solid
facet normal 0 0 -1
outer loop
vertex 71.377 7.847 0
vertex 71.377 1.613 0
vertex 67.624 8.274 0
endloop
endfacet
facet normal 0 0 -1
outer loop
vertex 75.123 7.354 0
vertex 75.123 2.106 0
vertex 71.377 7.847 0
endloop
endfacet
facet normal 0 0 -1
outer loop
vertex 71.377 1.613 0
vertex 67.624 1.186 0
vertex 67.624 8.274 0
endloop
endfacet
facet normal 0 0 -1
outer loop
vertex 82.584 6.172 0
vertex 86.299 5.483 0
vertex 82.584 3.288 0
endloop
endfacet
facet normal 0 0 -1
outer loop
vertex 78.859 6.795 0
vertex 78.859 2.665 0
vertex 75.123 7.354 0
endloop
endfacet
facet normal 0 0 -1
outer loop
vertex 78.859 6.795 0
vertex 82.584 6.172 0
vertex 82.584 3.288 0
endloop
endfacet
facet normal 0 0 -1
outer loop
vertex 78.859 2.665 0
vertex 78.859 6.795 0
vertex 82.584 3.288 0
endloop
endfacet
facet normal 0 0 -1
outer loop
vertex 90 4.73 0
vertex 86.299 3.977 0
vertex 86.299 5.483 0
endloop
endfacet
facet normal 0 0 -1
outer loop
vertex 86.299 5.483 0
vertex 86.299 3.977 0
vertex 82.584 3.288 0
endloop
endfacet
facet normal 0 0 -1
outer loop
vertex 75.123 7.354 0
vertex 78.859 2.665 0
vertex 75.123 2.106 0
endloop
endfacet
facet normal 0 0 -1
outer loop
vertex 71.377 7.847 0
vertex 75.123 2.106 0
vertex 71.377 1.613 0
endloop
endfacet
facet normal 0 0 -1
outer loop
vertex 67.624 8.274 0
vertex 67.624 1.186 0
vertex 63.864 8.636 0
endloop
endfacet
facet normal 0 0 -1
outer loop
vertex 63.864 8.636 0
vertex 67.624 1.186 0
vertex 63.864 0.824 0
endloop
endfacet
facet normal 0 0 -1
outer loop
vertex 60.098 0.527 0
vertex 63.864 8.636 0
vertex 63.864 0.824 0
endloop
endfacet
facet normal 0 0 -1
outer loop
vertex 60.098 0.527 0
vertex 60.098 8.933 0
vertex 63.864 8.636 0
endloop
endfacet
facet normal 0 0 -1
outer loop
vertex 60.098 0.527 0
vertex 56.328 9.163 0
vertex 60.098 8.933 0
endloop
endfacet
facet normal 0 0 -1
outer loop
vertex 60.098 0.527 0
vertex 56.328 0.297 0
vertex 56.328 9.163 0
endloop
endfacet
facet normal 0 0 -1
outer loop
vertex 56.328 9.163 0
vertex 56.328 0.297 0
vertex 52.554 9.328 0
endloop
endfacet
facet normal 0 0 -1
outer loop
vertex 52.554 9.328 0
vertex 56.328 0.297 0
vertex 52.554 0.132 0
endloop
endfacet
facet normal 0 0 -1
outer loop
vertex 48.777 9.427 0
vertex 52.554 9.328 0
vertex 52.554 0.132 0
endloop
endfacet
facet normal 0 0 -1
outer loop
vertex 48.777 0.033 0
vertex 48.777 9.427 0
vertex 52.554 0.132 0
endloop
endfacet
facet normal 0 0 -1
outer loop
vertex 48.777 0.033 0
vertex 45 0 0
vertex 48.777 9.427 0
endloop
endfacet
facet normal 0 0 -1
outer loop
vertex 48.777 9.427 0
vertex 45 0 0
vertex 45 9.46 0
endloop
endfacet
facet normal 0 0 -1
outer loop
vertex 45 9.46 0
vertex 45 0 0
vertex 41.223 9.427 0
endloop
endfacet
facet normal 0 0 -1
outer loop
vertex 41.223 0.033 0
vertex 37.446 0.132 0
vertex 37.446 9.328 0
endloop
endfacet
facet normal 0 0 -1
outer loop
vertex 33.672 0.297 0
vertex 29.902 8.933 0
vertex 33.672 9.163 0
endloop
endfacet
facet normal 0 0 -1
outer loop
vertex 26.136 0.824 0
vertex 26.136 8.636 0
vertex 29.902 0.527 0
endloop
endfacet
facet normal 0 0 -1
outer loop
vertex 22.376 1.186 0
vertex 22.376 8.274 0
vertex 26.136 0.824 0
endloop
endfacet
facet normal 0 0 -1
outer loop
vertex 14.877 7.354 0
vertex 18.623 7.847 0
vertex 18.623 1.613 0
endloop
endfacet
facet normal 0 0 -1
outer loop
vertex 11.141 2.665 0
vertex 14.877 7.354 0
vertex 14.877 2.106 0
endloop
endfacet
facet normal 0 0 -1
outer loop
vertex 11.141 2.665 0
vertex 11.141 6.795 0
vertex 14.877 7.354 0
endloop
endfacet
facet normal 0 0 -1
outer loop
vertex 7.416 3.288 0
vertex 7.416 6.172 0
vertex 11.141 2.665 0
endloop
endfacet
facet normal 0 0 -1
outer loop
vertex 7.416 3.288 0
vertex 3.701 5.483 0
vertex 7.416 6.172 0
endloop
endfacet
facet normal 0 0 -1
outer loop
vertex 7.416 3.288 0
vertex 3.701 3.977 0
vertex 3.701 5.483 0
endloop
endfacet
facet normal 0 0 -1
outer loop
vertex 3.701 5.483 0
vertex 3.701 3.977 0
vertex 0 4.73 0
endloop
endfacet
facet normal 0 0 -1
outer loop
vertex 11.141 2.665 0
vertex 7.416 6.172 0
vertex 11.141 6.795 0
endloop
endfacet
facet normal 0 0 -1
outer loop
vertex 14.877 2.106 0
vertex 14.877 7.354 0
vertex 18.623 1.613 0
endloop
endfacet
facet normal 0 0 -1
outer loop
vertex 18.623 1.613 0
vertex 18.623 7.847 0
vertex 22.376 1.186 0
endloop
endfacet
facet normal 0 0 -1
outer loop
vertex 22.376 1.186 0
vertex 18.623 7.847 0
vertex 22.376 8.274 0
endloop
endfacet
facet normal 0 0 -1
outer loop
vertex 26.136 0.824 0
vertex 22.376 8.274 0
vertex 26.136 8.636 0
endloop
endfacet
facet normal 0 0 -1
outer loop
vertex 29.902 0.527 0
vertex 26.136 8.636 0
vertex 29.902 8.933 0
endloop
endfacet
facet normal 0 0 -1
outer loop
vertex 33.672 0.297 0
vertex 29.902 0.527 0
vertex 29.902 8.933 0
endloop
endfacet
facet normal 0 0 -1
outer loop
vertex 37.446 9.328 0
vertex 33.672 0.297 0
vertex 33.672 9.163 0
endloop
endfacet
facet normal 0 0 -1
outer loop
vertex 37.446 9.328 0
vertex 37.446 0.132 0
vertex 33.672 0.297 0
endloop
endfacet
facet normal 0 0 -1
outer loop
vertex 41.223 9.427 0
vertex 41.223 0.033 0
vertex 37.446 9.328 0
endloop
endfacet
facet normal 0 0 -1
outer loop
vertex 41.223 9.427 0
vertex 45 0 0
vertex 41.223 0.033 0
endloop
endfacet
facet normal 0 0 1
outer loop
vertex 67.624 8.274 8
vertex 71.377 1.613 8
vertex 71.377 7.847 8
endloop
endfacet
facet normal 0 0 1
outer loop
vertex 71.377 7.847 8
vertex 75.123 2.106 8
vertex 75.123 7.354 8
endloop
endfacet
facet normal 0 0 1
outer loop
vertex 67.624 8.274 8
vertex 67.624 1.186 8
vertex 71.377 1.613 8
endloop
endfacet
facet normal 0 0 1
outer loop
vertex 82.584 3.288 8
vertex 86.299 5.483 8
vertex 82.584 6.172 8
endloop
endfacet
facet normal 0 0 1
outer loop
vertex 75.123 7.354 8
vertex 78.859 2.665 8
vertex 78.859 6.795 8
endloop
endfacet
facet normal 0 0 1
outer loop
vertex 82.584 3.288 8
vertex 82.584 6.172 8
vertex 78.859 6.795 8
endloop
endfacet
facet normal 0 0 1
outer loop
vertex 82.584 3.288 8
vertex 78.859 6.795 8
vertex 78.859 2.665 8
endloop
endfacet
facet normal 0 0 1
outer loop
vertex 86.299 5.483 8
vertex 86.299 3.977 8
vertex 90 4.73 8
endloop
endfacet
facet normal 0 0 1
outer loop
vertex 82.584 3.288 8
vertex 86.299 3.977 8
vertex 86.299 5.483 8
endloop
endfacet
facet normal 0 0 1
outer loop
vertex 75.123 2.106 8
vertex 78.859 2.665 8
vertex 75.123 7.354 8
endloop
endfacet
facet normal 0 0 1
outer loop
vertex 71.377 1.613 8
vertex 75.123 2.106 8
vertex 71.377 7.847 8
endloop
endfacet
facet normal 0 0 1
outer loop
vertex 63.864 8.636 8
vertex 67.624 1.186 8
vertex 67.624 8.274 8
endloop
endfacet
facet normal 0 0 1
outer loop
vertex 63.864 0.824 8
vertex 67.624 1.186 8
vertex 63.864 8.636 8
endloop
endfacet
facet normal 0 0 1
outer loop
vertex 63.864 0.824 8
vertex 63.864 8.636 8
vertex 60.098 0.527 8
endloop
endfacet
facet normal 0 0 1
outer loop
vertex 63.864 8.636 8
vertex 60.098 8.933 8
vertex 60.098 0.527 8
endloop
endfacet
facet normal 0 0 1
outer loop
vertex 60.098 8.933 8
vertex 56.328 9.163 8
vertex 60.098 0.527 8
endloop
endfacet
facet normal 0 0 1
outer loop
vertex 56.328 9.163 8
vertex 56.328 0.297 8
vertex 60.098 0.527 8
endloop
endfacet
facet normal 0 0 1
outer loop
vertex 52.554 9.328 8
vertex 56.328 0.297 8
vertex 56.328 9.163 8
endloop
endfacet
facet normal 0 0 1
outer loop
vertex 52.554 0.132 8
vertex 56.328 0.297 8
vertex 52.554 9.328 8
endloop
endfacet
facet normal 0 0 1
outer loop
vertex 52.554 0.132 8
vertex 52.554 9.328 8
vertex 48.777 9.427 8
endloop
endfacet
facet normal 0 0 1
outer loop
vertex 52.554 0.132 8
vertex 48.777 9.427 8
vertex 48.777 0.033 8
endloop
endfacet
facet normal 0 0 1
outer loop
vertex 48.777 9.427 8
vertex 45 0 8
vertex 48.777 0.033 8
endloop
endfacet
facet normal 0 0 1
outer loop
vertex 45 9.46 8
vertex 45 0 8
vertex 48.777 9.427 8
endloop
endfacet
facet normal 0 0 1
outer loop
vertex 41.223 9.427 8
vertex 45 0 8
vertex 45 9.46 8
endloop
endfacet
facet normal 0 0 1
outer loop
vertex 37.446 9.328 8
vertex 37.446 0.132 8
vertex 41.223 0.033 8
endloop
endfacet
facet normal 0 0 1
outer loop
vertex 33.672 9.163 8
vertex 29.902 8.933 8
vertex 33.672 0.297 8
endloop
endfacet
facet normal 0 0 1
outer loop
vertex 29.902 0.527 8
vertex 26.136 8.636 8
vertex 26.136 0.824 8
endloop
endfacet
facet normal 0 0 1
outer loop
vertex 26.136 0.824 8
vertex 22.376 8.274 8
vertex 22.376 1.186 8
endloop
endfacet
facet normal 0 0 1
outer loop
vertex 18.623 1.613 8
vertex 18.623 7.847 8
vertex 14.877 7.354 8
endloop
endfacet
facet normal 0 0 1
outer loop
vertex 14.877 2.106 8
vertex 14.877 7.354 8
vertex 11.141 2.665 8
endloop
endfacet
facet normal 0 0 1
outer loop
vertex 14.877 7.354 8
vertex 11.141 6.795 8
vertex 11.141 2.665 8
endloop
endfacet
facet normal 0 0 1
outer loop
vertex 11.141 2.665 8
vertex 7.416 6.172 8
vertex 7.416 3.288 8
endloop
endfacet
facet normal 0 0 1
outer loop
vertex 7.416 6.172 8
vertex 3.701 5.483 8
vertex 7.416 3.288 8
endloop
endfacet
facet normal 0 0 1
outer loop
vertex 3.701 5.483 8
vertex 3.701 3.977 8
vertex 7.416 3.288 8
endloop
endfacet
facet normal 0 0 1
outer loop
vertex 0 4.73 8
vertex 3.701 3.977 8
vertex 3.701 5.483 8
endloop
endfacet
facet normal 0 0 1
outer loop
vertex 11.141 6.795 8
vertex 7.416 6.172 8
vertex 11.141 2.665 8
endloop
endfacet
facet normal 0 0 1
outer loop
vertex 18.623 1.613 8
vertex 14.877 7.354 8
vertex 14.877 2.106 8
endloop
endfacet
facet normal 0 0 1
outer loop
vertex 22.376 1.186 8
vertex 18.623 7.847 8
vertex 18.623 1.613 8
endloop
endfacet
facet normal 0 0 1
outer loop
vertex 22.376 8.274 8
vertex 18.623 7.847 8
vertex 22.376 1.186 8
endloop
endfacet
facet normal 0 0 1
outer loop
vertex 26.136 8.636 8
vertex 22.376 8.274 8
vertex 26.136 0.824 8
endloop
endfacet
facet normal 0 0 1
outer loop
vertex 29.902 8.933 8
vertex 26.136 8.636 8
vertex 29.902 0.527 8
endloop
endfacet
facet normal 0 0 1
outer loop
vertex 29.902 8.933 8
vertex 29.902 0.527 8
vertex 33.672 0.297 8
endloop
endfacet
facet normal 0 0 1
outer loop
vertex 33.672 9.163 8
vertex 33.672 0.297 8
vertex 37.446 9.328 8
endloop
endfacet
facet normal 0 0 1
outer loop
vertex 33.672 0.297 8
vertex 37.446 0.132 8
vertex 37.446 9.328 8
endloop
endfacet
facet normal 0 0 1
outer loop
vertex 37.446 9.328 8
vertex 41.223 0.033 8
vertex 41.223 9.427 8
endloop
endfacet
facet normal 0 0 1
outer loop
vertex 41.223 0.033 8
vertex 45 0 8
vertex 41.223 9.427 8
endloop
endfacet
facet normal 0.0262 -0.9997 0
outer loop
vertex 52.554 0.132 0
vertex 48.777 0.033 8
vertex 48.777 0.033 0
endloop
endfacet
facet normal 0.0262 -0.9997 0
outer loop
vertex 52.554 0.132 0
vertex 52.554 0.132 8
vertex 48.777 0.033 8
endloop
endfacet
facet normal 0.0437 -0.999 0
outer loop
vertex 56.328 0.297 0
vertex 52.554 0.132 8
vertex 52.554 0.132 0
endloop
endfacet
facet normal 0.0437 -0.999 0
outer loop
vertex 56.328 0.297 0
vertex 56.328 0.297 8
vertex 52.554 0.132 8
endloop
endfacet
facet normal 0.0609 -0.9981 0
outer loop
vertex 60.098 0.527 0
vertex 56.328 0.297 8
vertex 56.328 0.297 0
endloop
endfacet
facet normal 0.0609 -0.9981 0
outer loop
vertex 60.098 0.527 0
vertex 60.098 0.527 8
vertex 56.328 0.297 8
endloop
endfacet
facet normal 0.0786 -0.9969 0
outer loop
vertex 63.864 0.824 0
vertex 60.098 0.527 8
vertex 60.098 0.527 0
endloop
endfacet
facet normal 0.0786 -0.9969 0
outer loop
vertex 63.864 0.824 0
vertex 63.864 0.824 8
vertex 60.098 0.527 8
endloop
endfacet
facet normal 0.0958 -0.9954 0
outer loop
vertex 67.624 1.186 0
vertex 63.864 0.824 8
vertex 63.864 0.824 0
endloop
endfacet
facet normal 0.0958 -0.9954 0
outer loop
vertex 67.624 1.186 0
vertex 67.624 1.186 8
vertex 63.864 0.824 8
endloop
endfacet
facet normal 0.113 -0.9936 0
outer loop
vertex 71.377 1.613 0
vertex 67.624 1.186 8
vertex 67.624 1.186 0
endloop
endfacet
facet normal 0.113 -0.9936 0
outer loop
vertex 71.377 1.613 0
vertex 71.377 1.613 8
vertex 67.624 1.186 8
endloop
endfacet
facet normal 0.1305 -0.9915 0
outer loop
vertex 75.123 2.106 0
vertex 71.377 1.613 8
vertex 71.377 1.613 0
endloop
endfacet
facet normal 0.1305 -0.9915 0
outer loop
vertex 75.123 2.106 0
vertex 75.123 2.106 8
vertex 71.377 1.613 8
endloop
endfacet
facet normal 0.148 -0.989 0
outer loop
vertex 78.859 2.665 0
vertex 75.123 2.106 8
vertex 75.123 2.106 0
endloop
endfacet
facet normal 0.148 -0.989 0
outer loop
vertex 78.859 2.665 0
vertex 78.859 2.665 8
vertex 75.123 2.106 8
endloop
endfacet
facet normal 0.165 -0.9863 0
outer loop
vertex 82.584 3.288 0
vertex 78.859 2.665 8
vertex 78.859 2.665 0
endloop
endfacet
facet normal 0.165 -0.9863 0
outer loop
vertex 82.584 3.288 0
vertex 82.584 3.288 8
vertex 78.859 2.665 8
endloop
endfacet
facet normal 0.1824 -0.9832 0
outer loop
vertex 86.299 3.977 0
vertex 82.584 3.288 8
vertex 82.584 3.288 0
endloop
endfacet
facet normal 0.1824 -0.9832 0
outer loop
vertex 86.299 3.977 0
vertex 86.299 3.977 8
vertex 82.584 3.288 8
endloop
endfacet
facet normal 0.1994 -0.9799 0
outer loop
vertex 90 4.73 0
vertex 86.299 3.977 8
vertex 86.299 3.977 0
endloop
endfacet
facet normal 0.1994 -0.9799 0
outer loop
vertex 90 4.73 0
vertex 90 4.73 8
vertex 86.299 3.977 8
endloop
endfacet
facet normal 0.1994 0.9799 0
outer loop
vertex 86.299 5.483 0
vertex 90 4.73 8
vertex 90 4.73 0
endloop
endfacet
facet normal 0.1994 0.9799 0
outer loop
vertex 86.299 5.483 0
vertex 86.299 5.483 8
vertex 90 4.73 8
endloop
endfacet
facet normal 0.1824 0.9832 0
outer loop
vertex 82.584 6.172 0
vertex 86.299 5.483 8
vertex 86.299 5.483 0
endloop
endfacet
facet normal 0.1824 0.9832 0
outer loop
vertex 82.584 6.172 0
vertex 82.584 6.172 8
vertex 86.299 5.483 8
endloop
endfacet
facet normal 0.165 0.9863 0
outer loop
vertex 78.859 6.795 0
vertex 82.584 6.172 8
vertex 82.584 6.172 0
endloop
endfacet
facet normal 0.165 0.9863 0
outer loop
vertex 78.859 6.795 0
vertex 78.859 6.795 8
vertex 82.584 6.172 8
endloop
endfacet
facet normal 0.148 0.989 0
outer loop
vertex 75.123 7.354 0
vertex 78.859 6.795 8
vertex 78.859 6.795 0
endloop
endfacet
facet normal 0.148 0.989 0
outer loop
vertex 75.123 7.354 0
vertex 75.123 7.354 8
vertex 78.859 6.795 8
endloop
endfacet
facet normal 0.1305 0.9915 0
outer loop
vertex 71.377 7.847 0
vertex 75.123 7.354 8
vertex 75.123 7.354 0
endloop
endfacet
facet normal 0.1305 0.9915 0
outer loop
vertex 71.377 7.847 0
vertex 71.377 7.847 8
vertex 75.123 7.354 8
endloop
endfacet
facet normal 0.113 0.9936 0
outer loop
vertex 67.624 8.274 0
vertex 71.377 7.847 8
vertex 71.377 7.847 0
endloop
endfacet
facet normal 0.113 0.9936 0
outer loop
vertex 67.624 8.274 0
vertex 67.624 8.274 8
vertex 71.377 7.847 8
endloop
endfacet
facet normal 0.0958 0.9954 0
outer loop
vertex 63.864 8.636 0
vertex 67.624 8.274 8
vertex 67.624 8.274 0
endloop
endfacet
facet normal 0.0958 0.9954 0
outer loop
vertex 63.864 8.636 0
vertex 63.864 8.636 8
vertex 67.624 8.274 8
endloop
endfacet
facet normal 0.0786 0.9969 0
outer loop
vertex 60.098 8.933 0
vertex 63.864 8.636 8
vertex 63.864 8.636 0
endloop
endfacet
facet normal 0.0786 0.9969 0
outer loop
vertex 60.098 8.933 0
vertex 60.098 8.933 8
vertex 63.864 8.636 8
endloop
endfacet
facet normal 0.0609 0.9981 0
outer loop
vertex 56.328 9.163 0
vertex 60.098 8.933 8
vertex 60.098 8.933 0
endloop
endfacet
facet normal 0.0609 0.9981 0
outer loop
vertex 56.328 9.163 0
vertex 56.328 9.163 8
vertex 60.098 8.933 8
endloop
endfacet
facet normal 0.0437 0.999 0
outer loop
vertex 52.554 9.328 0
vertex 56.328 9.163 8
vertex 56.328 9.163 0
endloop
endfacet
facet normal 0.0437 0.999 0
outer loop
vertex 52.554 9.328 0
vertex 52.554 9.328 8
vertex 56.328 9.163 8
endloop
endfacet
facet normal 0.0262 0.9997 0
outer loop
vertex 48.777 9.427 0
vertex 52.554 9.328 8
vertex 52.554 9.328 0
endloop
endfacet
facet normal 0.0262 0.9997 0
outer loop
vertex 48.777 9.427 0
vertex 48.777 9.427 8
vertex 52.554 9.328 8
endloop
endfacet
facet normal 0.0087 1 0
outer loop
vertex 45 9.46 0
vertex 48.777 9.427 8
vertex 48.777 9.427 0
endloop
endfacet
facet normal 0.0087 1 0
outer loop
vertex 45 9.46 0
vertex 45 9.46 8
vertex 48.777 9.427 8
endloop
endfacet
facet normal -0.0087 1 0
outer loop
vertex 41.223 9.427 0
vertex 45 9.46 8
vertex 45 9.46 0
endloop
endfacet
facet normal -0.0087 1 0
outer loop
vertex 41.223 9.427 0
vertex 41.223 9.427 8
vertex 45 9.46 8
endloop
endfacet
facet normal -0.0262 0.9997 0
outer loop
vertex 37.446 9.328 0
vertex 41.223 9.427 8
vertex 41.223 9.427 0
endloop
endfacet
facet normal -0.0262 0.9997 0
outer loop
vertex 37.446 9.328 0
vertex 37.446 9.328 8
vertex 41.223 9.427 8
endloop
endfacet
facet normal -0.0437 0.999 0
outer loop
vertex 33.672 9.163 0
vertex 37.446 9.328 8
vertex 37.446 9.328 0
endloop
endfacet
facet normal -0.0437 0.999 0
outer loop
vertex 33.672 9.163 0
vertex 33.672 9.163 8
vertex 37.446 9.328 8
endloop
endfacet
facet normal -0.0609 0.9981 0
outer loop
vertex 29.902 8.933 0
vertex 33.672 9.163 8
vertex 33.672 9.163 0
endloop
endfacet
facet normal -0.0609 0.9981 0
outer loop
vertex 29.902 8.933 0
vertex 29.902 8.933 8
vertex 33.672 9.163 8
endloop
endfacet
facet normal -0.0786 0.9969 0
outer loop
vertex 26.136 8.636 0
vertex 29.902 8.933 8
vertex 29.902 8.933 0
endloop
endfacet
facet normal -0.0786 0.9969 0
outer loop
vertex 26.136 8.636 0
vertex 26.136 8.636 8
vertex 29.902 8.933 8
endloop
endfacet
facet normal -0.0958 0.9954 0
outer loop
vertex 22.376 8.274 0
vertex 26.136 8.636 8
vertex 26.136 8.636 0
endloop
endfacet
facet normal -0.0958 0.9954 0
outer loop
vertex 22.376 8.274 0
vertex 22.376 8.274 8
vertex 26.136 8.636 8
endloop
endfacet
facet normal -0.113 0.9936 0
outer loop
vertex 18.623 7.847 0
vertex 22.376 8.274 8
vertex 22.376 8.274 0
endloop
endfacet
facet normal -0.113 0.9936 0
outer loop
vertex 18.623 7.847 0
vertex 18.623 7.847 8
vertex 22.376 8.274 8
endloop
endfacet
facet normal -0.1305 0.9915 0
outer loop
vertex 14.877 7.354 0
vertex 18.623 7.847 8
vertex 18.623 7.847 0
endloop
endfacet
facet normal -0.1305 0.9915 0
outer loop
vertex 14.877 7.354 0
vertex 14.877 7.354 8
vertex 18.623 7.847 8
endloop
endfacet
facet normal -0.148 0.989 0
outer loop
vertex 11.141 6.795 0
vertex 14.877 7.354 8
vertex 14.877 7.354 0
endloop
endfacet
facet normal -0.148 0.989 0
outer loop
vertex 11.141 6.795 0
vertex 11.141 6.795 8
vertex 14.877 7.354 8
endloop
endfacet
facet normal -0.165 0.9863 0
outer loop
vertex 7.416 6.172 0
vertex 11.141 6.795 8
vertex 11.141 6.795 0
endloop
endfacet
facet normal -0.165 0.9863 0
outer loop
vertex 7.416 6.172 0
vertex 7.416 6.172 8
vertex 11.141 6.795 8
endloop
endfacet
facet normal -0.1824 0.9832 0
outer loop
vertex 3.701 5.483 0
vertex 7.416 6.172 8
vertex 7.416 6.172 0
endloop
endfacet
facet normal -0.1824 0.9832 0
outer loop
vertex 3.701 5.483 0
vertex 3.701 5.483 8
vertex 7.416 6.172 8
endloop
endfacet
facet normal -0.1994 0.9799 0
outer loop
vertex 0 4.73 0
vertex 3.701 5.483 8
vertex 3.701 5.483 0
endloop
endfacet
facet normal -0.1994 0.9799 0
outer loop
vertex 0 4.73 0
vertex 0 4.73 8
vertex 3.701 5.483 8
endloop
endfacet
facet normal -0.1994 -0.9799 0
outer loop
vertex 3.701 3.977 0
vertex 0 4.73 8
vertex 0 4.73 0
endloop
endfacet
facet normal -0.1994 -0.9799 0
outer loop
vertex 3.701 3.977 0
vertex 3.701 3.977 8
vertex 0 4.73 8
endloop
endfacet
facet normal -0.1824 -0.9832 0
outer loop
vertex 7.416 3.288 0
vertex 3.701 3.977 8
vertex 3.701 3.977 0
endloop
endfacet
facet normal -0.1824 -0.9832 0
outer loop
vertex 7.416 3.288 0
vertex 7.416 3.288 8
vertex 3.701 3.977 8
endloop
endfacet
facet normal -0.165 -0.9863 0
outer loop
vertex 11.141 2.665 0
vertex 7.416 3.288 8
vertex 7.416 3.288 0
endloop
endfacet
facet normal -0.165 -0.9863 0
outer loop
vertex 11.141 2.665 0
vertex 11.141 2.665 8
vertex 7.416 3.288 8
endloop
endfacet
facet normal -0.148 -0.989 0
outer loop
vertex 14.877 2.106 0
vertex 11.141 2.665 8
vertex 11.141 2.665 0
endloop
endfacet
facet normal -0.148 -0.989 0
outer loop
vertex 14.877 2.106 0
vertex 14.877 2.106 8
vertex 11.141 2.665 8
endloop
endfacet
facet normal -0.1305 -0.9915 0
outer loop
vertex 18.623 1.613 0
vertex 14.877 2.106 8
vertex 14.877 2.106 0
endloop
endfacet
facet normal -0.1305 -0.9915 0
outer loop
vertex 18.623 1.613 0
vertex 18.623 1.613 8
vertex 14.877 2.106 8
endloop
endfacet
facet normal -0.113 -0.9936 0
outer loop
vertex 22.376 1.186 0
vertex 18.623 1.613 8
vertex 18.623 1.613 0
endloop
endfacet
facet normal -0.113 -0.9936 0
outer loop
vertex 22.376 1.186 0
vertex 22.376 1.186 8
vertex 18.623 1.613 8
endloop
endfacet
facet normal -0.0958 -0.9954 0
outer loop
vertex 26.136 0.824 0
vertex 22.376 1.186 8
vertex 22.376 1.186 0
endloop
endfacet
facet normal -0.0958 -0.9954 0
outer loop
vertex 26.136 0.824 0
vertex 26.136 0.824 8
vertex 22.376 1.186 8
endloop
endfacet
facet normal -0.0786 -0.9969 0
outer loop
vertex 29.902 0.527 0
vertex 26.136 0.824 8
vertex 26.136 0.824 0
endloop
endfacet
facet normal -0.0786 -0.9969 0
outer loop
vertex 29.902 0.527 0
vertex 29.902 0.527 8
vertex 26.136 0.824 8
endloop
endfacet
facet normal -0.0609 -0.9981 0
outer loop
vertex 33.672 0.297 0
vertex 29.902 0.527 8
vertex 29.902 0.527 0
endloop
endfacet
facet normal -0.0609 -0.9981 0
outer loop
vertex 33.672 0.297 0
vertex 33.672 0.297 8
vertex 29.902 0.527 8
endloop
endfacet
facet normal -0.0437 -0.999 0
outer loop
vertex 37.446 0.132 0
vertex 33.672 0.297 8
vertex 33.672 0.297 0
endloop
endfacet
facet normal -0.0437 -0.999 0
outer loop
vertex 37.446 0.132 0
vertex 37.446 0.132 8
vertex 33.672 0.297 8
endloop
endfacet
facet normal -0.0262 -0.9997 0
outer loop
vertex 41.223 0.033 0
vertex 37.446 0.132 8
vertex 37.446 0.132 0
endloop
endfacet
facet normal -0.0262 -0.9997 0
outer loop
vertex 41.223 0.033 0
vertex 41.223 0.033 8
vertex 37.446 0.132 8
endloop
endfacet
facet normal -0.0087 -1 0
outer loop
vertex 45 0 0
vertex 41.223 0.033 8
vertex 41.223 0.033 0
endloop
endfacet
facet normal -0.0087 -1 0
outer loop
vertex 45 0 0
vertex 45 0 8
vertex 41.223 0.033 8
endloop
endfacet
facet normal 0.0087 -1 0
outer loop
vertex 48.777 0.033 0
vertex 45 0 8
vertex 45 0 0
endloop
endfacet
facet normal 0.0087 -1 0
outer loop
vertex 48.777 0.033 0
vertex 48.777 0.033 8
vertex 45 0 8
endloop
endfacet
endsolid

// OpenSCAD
$fn = 32;

// ----------------------------------------------------------------------
// Arc profile plate: lens, 48 points
// ----------------------------------------------------------------------

// --- parameters (mm) ---
lens_chord = 90;          // chord length of the lens, X
arc_r = 216.44;           // radius of both arcs
arc_angle = 24;           // angle of each arc, degrees
sagitta = 4.73;           // bulge of each arc (half the lens height)
arc_step = 1;             // sampling step of the arcs, degrees
plate_t = 8;              // plate thickness, Z

bbox_y = 2 * sagitta;  // full lens height

profile = [[90, 4.73], [86.299, 5.483], [82.584, 6.172], [78.859, 6.795], [75.123, 7.354], [71.377, 7.847], [67.624, 8.274], [63.864, 8.636], [60.098, 8.933], [56.328, 9.163], [52.554, 9.328], [48.777, 9.427], [45, 9.46], [41.223, 9.427], [37.446, 9.328], [33.672, 9.163], [29.902, 8.933], [26.136, 8.636], [22.376, 8.274], [18.623, 7.847], [14.877, 7.354], [11.141, 6.795], [7.416, 6.172], [3.701, 5.483], [0, 4.73], [3.701, 3.977], [7.416, 3.288], [11.141, 2.665], [14.877, 2.106], [18.623, 1.613], [22.376, 1.186], [26.136, 0.824], [29.902, 0.527], [33.672, 0.297], [37.446, 0.132], [41.223, 0.033], [45, 0], [48.777, 0.033], [52.554, 0.132], [56.328, 0.297], [60.098, 0.527], [63.864, 0.824], [67.624, 1.186], [71.377, 1.613], [75.123, 2.106], [78.859, 2.665], [82.584, 3.288], [86.299, 3.977]];  // primary outline, 48 points, counter clockwise

// --- the one profile operation ---
linear_extrude(height = plate_t) polygon(points = profile);
